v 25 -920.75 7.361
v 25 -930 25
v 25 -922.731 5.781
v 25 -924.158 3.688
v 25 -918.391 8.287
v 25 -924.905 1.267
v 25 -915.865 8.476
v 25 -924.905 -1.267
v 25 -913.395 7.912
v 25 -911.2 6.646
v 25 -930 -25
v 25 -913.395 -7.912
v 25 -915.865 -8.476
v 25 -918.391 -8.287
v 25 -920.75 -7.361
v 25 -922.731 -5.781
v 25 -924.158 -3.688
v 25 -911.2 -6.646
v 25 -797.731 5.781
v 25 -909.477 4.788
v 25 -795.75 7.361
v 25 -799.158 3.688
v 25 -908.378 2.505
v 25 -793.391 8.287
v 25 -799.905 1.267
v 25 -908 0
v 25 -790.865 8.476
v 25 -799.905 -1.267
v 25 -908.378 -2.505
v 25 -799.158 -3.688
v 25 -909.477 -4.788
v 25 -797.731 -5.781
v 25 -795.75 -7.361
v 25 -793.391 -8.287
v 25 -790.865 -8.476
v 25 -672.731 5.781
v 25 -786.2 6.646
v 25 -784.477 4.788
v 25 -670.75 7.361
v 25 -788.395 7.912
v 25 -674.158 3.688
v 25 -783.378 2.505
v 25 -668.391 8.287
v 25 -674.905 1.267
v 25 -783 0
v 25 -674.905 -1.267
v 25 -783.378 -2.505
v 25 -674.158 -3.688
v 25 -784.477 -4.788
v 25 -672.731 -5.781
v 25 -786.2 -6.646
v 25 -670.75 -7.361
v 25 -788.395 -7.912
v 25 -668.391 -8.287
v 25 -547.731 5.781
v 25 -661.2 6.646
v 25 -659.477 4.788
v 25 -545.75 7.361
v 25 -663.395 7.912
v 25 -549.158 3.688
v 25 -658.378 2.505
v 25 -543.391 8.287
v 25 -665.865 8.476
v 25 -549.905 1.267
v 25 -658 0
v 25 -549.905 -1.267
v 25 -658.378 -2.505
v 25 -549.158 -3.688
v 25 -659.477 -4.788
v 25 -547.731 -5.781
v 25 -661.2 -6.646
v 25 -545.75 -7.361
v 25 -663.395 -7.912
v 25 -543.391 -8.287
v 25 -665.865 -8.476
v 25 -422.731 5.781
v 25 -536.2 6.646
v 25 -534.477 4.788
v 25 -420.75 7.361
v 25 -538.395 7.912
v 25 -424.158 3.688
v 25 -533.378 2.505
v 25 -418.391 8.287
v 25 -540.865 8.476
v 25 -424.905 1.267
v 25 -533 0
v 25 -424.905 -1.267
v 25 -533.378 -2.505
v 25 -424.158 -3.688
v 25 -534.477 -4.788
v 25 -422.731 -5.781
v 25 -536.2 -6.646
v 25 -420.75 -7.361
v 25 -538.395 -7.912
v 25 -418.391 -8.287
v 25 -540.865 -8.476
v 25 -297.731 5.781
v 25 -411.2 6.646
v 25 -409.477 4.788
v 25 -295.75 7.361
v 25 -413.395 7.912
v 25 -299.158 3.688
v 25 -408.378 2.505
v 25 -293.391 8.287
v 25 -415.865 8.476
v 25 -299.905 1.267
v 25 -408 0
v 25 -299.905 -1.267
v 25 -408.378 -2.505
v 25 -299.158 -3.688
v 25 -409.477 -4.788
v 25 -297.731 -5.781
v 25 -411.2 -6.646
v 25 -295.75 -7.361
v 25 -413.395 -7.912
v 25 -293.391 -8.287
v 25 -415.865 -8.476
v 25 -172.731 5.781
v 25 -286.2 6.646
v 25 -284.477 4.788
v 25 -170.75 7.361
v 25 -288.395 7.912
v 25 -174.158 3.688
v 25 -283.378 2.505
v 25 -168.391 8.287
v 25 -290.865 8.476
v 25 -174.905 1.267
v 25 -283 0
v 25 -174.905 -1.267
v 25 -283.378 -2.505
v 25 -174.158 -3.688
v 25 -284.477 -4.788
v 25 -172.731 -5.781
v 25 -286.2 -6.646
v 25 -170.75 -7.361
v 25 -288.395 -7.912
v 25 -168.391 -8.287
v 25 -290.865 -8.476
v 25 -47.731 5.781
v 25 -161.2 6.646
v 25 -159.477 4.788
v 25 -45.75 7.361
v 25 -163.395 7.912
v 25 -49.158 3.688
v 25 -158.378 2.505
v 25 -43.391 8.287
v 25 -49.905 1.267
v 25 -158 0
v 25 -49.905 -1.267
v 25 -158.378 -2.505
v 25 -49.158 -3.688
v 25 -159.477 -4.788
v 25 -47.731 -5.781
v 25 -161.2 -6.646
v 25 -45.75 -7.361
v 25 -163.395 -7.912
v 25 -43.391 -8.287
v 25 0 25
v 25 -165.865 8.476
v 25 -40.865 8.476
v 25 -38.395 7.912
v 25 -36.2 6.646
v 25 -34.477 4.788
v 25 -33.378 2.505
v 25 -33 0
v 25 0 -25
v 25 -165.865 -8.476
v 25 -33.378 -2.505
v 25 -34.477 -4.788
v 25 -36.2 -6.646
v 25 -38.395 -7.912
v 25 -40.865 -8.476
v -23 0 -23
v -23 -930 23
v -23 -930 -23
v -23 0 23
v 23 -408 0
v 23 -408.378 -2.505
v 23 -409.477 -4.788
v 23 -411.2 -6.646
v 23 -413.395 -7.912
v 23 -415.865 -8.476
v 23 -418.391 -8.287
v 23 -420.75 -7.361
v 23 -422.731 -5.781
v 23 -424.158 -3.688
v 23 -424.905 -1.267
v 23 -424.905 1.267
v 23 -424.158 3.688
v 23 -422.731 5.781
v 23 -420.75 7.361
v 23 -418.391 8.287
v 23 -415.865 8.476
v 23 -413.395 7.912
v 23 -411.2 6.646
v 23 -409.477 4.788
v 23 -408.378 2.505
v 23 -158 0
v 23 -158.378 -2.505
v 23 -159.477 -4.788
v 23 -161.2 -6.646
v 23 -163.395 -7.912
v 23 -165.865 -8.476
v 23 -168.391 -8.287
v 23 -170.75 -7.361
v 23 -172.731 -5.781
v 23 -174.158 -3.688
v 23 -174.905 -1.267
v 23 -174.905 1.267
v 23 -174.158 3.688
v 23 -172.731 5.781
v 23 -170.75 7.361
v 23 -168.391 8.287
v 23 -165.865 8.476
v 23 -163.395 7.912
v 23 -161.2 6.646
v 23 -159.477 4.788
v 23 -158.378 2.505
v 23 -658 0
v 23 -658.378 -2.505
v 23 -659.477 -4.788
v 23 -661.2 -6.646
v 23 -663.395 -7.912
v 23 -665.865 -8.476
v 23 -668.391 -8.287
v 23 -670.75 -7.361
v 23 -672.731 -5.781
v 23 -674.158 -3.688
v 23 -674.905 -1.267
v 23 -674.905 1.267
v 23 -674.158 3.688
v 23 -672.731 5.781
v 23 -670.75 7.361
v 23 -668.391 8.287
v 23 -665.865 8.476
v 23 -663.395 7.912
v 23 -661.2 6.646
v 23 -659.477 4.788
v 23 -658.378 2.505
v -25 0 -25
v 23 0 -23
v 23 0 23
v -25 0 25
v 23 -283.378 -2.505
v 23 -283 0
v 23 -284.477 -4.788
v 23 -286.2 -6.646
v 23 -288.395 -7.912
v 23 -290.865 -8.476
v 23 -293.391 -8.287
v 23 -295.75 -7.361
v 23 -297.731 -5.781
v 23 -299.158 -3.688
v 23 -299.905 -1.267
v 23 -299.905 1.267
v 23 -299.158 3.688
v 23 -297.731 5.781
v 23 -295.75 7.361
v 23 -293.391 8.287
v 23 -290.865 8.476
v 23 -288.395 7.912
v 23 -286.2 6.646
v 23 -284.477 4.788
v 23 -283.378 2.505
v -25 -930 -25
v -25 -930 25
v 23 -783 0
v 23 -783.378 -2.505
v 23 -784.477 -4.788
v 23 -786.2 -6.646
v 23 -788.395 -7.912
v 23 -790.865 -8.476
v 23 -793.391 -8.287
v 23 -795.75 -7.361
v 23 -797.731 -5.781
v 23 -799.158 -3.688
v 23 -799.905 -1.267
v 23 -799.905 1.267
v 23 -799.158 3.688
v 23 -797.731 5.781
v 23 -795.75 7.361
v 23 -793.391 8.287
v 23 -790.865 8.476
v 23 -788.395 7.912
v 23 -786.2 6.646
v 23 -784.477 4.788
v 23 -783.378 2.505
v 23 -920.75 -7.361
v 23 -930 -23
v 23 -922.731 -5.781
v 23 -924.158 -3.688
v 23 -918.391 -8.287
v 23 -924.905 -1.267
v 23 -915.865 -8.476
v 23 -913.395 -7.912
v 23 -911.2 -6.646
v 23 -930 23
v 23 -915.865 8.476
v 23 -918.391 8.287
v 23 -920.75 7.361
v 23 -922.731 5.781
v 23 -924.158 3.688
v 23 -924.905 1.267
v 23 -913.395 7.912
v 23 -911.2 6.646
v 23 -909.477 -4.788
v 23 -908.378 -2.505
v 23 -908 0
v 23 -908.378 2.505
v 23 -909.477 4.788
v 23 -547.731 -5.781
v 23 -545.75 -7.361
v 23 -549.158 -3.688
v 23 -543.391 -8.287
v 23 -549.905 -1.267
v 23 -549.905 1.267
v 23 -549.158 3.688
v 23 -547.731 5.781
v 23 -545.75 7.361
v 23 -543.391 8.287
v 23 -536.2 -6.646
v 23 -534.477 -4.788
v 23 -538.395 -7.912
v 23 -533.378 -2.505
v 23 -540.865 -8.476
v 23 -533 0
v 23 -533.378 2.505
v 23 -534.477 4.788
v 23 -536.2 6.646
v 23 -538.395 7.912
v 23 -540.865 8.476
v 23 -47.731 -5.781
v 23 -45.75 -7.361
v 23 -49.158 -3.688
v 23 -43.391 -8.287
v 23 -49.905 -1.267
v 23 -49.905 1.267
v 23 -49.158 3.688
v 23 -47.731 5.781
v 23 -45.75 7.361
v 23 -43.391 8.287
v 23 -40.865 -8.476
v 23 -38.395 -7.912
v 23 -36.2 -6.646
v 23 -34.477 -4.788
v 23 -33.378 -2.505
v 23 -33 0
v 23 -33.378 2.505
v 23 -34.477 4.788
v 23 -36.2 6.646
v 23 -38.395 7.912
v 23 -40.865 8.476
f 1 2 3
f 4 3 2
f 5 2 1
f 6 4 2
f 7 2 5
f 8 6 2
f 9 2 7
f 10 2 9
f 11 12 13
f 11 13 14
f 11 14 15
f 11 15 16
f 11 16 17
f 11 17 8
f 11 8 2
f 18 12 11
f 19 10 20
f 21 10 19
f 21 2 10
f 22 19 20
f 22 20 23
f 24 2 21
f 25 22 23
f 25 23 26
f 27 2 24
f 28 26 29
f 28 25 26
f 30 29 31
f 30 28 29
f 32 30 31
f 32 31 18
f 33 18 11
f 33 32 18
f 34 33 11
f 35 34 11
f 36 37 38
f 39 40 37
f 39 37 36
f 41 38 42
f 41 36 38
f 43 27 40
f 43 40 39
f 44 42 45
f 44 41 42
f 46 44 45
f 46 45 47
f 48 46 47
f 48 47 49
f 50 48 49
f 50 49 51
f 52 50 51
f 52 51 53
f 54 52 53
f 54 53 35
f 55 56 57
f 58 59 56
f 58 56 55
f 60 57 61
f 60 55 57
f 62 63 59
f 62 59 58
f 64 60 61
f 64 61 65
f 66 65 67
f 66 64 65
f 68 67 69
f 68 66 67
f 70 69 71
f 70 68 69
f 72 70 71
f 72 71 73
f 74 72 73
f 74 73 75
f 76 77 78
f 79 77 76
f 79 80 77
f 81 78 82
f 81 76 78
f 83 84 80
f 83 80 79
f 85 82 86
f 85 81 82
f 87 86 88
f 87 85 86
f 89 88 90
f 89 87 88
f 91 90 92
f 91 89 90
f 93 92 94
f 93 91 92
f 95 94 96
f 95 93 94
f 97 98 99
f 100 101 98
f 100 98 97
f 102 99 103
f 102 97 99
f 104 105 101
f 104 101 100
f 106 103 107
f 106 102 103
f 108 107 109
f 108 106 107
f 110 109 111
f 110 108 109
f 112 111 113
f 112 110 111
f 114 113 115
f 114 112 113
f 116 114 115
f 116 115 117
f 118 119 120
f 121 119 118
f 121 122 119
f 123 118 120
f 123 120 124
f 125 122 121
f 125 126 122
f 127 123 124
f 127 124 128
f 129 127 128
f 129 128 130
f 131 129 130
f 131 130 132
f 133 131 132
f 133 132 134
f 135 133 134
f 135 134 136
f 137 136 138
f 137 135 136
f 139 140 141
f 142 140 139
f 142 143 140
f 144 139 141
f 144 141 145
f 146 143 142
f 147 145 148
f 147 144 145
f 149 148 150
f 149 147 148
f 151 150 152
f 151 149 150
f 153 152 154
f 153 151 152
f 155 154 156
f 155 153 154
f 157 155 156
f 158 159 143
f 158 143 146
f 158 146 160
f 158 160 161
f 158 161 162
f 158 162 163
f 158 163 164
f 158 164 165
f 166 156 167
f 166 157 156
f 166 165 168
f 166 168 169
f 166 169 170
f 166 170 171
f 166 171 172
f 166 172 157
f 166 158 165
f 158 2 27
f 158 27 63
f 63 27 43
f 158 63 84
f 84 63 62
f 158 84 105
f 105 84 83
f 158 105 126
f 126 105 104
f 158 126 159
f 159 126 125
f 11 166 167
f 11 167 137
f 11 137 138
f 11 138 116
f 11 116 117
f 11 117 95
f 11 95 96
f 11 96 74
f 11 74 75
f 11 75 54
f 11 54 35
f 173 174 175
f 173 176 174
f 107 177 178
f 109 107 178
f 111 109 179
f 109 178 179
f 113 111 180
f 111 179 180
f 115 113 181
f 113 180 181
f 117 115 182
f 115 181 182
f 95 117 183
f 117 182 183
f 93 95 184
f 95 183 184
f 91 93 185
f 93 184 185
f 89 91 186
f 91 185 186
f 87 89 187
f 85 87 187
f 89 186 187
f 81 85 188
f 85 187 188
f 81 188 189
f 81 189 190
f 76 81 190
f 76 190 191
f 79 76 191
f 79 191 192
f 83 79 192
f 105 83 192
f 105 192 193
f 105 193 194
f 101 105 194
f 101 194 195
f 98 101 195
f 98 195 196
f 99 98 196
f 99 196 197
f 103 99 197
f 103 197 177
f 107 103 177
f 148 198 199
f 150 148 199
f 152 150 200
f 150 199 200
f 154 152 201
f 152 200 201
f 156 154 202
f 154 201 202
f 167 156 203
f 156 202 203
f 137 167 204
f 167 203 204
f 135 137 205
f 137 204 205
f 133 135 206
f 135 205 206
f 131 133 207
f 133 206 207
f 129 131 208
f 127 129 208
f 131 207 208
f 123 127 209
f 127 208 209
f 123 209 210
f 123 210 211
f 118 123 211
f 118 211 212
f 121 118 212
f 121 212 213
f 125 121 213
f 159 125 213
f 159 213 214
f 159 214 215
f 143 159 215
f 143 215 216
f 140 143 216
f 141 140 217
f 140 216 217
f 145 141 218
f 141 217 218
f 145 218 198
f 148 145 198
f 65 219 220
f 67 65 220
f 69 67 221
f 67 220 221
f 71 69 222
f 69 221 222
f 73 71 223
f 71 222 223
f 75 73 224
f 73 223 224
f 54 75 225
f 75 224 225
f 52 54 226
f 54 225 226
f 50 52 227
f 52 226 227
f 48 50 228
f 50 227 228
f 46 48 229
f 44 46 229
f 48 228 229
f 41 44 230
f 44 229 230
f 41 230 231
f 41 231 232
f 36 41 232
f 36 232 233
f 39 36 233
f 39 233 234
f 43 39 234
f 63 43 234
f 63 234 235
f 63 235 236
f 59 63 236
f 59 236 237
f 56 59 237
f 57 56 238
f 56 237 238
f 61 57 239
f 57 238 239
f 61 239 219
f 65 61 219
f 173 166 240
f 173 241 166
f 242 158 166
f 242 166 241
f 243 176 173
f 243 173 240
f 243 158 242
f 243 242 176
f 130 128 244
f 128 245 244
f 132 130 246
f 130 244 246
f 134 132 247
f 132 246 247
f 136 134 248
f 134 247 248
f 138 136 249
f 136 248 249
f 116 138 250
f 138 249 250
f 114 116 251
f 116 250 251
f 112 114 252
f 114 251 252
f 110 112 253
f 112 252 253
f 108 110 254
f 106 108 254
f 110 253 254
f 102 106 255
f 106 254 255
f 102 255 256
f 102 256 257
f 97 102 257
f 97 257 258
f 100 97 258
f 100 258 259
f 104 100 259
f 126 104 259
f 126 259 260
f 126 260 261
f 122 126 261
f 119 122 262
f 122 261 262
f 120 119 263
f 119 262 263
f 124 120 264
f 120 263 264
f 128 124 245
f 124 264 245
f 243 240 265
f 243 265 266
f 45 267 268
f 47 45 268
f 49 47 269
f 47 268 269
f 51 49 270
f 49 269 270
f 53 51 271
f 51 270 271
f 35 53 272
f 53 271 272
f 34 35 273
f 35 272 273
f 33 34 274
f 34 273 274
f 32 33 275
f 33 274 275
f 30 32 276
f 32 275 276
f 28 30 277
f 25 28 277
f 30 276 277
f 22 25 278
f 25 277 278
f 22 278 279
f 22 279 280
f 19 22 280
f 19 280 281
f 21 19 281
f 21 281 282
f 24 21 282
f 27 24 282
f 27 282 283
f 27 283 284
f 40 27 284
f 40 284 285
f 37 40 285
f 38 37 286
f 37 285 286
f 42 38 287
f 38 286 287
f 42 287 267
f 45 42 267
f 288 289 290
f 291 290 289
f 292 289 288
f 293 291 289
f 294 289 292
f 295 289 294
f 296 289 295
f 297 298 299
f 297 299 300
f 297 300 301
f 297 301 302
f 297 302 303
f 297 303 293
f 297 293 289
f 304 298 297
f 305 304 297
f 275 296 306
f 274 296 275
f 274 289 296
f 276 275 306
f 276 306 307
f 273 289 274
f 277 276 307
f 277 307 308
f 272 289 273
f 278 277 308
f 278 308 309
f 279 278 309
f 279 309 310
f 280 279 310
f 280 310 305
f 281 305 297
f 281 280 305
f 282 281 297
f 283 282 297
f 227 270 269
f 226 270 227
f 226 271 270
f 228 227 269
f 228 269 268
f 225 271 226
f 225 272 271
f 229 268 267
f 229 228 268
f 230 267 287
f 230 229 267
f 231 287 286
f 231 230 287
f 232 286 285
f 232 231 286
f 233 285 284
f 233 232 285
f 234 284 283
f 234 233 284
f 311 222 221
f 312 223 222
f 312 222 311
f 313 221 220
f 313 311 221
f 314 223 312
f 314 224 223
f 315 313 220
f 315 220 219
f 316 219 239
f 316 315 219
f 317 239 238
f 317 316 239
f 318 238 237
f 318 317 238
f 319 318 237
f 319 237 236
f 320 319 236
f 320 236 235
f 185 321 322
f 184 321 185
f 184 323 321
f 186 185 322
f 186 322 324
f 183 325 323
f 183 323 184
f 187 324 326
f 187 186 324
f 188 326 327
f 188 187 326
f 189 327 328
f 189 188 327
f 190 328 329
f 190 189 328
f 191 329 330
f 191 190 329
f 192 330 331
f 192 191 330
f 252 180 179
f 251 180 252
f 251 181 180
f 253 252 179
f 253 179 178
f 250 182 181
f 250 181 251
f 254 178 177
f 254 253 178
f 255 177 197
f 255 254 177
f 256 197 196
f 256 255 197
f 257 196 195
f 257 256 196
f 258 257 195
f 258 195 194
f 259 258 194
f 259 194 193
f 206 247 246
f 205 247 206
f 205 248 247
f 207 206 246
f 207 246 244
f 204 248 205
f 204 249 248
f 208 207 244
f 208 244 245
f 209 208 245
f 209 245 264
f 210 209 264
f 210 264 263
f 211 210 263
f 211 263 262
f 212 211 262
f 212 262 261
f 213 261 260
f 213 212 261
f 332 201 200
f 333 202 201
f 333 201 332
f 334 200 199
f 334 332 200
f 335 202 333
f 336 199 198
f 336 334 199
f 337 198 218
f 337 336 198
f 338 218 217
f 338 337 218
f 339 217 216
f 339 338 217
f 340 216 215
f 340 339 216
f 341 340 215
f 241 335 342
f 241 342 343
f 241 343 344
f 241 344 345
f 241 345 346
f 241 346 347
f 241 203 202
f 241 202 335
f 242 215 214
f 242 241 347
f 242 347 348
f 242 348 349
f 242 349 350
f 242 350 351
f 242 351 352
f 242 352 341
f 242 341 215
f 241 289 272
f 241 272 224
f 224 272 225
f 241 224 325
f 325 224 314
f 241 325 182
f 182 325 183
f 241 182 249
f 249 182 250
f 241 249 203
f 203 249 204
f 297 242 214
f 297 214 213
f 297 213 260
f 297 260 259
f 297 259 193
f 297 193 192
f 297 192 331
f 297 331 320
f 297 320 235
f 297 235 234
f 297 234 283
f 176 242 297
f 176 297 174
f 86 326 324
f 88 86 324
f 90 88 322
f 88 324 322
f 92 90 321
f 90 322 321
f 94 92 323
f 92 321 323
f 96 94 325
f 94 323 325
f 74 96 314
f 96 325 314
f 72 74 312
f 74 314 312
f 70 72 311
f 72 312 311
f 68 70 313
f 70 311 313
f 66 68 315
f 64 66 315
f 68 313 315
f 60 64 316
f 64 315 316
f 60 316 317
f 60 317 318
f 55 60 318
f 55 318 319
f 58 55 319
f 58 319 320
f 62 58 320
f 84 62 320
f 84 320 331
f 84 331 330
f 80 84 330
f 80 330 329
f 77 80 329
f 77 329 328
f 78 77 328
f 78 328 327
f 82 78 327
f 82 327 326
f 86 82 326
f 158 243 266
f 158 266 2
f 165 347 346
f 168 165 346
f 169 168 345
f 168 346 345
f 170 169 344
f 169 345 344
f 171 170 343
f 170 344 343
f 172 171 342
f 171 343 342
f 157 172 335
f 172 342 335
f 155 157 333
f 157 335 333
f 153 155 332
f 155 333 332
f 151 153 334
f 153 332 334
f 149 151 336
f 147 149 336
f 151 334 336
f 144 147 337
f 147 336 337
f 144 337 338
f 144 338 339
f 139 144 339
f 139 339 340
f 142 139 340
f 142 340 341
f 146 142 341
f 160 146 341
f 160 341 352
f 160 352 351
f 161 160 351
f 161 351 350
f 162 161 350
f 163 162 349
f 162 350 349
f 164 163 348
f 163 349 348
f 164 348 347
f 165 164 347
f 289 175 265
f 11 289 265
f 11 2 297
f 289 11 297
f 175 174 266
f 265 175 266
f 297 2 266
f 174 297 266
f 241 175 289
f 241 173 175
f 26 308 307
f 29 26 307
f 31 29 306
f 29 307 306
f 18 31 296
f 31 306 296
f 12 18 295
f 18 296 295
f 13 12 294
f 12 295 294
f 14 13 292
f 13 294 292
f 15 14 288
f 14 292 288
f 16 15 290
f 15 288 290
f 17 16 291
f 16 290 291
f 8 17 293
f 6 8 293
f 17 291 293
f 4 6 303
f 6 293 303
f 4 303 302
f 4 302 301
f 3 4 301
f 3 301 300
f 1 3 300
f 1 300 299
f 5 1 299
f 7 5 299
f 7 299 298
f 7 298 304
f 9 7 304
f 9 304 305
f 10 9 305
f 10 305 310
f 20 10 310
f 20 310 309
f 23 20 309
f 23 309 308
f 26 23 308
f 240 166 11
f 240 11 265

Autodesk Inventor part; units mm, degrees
ref_plane "YZ Plane" through (0, 0, 0) normal (1, 0, 0) x (0, 1, 0)
ref_plane "XZ Plane" through (0, 0, 0) normal (0, 1, 0) x (-1, 0, 0)
ref_plane "XY Plane" through (0, 0, 0) normal (0, 0, 1) x (1, 0, 0)
sketch "Sketch9" plane through (0, 0, 0) normal (0, 1, 0) x (-1, 0, 0)
  line L0 (25, 25) -> (-25, 25)
  line L1 (-25, 25) -> (-25, -25)
  line L2 (-25, -25) -> (25, -25)
  line L3 (25, -25) -> (25, 25)
  line L4 (25, 25) -> (-25, -25) construction
  line L5 (-25, 25) -> (25, -25) construction
  line L6 (-23, 23) -> (23, 23)
  line L7 (23, 23) -> (23, -23)
  line L8 (23, -23) -> (-23, -23)
  line L9 (-23, -23) -> (-23, 23)
  point P0 (0, 0)
  dimension "d172" = 50
  dimension "d173" = 50
  dimension "d174" = 2
extrude "Extrusion3" add sketch "Sketch9" against normal blind 930
sketch "Sketch10" plane through (0, 0, 0) normal (1, 0, 0) x (0, 1, 0)
  line L0 (0, 25) -> (0, -25) construction
  line L1 (0, 25) -> (-930, 25) construction
  line L2 (-930, -25) -> (-930, 25) construction
  line L3 (0, -25) -> (-930, -25) construction
  line L4 (-925, 8.5) -> (-908, 8.5)
  line L5 (-908, 8.5) -> (-908, -8.5)
  line L6 (-908, -8.5) -> (-925, -8.5)
  line L7 (-925, -8.5) -> (-925, 8.5)
  line L8 (-925, 8.5) -> (-908, -8.5) construction
  line L9 (-908, 8.5) -> (-925, -8.5) construction
  circle A0 centre (-916.5, 0) radius 8.5
  line L10 (0, 25) -> (0, -25) projected
  point P0 (0, 0)
  point P1 (0, 0)
  point P2 (-930, 0)
  dimension "d177" = 17
  dimension "d178" = 17
  dimension "d191" = 5
extrude "Extrusion4" cut sketch "Sketch10" along normal through all contours A0
pattern_linear "Rectangular Pattern4" count 8 spacing 125 along (0, 1, 0) of "Extrusion4"
properties part number "TKS 3535 FDS WAY tube5" material "Stainless Steel"
